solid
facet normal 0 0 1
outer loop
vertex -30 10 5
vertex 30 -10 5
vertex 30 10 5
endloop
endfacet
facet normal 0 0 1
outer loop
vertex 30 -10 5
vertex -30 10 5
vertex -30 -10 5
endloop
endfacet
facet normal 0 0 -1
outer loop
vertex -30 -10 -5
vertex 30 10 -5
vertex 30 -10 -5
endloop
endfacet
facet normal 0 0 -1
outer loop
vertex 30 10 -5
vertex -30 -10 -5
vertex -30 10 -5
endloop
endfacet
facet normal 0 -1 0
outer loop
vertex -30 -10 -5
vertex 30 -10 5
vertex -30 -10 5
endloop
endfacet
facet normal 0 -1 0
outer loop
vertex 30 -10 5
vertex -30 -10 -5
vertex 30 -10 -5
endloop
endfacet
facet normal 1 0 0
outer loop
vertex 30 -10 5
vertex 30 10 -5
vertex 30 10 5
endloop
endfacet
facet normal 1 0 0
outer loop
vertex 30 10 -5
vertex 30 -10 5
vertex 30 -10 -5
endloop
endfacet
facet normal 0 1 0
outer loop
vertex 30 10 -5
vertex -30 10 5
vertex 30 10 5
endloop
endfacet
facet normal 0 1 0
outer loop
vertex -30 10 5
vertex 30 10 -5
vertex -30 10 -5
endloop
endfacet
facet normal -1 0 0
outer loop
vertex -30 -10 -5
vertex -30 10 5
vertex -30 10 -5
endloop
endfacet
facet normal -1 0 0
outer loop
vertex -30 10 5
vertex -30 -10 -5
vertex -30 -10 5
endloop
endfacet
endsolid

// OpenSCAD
module body(base_height=10, top_height=14, base_length=60, top_length=30, width=20, top_offset=5, top=true) {
    // Car body base
    cube([base_length, width, base_height], center=true);
    // Car body top
    if (top) {
        translate([top_offset, 0, base_height/2+top_height/2-0.001])
            cube([top_length, width, top_height], center=true);
    }
}

body(top=false);
